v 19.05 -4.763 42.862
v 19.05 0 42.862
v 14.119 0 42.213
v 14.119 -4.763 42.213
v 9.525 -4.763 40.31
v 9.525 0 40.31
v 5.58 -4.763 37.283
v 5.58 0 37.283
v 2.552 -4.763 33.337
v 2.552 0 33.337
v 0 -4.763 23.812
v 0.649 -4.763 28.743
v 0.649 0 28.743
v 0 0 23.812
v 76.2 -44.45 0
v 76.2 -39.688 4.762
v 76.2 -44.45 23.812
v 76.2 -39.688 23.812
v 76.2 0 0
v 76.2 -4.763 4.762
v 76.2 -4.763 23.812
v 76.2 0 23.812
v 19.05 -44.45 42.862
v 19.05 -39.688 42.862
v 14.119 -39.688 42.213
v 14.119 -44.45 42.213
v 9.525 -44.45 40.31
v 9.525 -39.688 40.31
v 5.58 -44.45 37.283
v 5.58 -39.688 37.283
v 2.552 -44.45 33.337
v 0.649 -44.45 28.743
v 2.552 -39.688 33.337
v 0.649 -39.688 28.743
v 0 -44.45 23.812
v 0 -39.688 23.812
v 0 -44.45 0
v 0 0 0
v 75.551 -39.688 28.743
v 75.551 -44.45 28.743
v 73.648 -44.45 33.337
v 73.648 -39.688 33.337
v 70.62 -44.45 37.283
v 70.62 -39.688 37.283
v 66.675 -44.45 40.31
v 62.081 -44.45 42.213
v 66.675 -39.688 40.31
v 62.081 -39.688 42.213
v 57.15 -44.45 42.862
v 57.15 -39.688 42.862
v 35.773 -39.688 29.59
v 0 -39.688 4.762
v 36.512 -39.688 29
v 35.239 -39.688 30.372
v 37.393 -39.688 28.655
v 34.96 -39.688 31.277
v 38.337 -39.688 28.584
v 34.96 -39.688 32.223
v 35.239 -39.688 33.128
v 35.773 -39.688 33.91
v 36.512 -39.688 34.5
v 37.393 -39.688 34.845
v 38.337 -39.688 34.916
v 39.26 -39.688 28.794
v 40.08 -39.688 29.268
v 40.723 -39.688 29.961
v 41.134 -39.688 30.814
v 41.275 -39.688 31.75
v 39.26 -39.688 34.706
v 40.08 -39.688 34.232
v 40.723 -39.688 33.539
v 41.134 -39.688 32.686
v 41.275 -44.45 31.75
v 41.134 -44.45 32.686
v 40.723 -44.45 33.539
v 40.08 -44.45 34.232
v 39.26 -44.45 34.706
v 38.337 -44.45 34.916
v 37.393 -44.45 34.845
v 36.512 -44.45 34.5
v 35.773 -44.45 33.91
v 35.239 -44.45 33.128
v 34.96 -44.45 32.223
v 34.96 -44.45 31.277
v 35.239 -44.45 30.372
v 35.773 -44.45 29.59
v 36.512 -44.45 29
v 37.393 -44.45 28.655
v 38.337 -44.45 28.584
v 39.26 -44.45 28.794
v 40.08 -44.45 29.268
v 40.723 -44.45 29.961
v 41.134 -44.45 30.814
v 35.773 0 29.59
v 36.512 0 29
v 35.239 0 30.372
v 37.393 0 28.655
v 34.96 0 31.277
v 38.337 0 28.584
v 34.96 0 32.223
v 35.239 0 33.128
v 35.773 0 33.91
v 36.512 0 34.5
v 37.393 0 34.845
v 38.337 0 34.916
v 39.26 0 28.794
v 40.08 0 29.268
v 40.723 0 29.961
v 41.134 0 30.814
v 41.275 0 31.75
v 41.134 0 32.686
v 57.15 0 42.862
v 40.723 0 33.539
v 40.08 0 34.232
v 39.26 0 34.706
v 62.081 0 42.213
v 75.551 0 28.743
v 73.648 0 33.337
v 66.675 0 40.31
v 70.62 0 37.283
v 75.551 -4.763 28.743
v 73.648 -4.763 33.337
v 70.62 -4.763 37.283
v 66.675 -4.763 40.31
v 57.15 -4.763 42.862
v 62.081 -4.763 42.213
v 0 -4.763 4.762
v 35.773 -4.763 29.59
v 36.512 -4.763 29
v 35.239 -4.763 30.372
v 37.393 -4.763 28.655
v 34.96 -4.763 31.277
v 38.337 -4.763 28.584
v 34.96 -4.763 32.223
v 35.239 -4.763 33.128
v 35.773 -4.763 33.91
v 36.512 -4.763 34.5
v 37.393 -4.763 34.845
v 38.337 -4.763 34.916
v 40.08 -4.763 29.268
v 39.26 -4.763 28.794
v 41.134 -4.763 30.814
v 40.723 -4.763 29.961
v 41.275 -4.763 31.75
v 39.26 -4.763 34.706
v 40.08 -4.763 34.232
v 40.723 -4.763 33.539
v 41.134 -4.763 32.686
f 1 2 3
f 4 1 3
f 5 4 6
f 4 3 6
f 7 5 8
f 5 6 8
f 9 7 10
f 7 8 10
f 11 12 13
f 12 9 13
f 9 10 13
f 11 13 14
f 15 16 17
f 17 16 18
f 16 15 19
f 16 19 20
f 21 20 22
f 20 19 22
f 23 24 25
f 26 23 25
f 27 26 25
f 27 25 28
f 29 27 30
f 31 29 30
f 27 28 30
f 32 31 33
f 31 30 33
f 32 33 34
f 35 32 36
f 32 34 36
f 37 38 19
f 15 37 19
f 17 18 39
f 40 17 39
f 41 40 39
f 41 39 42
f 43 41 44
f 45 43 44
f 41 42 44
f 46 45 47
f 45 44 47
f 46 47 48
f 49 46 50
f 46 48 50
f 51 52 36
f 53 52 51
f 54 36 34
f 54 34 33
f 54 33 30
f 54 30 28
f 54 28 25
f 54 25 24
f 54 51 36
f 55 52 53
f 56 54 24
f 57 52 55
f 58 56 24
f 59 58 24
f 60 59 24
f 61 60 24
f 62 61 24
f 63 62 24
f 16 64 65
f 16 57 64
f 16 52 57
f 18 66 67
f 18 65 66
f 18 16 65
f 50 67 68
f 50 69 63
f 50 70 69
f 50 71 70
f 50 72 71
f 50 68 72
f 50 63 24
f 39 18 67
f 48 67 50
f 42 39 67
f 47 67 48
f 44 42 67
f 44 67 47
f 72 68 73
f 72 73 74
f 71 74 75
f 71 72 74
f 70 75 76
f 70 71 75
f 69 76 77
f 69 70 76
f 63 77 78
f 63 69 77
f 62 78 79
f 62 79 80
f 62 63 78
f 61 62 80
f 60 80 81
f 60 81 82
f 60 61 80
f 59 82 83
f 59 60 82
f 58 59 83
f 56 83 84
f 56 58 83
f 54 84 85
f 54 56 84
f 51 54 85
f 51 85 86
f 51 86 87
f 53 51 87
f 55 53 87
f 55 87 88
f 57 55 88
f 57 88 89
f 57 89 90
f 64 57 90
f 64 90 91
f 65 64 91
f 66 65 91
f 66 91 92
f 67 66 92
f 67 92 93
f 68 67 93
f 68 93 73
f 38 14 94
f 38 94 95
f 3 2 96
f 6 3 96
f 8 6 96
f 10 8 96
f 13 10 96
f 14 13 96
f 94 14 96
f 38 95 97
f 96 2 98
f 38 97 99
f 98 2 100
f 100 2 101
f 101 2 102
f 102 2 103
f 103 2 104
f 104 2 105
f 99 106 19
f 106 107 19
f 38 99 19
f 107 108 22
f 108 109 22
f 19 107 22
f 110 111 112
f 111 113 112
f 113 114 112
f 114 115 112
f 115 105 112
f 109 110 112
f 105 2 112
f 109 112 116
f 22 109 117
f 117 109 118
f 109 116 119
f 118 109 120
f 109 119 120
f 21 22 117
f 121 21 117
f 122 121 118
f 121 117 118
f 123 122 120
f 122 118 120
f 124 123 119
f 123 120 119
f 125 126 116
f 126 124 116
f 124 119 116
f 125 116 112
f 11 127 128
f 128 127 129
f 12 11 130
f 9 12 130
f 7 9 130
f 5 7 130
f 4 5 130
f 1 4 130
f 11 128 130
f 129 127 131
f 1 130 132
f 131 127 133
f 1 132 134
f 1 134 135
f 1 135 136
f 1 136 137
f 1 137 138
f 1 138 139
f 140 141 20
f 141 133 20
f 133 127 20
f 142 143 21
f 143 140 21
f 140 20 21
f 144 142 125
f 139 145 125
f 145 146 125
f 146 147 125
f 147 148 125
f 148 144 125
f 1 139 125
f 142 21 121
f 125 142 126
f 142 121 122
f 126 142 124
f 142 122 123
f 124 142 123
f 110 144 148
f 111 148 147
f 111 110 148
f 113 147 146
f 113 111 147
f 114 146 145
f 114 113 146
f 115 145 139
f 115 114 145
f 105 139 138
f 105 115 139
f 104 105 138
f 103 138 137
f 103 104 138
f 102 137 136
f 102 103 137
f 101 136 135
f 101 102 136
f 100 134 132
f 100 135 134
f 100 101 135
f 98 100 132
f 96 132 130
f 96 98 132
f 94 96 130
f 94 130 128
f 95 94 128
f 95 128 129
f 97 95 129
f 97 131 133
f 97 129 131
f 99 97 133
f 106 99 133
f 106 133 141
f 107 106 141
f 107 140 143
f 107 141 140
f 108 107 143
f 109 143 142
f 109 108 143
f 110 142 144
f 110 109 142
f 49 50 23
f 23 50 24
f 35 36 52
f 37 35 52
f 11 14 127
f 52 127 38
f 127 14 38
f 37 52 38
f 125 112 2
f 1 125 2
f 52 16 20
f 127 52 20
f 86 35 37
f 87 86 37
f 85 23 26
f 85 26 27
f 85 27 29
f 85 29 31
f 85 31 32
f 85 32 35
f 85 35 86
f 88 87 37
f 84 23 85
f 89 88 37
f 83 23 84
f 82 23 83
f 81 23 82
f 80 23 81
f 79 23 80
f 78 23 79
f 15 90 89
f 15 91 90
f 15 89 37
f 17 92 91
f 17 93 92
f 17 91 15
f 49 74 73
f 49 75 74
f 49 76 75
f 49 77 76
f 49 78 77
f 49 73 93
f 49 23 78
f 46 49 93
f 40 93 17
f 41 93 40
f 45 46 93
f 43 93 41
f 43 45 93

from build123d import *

# Parameters (mm, degrees)
F0_R     = 3.175
F1_DEPTH = 44.45
F2_W     = 34.925
F2_H     = 40.217792
F3_DEPTH = 76.201


with BuildPart() as f1:
    # F0 (on Front) → F1 (new body)
    with BuildSketch(Plane.XZ):
        with BuildLine():
            Line((0, 23.8125), (0, 0))
            Line((0, 0), (76.2, 0))
            Line((76.2, 0), (76.2, 23.8125))
            ThreePointArc((76.2, 23.8125), (70.620384, 37.282884), (57.15, 42.8625))
            Line((57.15, 42.8625), (19.05, 42.8625))
            ThreePointArc((19.05, 42.8625), (5.579616, 37.282884), (0, 23.8125))
        make_face()
        with Locations((38.1, 31.75)):
            Circle(F0_R, mode=Mode.SUBTRACT)
    extrude(amount=F1_DEPTH)

    # F2 (on face) → F3 (cut, through all)
    with BuildSketch(Plane.YZ.offset(76.2)):
        with Locations((-22.225, 24.871396)):
            Rectangle(F2_W, F2_H)
    extrude(amount=-F3_DEPTH, mode=Mode.SUBTRACT)


solid = f1.part
